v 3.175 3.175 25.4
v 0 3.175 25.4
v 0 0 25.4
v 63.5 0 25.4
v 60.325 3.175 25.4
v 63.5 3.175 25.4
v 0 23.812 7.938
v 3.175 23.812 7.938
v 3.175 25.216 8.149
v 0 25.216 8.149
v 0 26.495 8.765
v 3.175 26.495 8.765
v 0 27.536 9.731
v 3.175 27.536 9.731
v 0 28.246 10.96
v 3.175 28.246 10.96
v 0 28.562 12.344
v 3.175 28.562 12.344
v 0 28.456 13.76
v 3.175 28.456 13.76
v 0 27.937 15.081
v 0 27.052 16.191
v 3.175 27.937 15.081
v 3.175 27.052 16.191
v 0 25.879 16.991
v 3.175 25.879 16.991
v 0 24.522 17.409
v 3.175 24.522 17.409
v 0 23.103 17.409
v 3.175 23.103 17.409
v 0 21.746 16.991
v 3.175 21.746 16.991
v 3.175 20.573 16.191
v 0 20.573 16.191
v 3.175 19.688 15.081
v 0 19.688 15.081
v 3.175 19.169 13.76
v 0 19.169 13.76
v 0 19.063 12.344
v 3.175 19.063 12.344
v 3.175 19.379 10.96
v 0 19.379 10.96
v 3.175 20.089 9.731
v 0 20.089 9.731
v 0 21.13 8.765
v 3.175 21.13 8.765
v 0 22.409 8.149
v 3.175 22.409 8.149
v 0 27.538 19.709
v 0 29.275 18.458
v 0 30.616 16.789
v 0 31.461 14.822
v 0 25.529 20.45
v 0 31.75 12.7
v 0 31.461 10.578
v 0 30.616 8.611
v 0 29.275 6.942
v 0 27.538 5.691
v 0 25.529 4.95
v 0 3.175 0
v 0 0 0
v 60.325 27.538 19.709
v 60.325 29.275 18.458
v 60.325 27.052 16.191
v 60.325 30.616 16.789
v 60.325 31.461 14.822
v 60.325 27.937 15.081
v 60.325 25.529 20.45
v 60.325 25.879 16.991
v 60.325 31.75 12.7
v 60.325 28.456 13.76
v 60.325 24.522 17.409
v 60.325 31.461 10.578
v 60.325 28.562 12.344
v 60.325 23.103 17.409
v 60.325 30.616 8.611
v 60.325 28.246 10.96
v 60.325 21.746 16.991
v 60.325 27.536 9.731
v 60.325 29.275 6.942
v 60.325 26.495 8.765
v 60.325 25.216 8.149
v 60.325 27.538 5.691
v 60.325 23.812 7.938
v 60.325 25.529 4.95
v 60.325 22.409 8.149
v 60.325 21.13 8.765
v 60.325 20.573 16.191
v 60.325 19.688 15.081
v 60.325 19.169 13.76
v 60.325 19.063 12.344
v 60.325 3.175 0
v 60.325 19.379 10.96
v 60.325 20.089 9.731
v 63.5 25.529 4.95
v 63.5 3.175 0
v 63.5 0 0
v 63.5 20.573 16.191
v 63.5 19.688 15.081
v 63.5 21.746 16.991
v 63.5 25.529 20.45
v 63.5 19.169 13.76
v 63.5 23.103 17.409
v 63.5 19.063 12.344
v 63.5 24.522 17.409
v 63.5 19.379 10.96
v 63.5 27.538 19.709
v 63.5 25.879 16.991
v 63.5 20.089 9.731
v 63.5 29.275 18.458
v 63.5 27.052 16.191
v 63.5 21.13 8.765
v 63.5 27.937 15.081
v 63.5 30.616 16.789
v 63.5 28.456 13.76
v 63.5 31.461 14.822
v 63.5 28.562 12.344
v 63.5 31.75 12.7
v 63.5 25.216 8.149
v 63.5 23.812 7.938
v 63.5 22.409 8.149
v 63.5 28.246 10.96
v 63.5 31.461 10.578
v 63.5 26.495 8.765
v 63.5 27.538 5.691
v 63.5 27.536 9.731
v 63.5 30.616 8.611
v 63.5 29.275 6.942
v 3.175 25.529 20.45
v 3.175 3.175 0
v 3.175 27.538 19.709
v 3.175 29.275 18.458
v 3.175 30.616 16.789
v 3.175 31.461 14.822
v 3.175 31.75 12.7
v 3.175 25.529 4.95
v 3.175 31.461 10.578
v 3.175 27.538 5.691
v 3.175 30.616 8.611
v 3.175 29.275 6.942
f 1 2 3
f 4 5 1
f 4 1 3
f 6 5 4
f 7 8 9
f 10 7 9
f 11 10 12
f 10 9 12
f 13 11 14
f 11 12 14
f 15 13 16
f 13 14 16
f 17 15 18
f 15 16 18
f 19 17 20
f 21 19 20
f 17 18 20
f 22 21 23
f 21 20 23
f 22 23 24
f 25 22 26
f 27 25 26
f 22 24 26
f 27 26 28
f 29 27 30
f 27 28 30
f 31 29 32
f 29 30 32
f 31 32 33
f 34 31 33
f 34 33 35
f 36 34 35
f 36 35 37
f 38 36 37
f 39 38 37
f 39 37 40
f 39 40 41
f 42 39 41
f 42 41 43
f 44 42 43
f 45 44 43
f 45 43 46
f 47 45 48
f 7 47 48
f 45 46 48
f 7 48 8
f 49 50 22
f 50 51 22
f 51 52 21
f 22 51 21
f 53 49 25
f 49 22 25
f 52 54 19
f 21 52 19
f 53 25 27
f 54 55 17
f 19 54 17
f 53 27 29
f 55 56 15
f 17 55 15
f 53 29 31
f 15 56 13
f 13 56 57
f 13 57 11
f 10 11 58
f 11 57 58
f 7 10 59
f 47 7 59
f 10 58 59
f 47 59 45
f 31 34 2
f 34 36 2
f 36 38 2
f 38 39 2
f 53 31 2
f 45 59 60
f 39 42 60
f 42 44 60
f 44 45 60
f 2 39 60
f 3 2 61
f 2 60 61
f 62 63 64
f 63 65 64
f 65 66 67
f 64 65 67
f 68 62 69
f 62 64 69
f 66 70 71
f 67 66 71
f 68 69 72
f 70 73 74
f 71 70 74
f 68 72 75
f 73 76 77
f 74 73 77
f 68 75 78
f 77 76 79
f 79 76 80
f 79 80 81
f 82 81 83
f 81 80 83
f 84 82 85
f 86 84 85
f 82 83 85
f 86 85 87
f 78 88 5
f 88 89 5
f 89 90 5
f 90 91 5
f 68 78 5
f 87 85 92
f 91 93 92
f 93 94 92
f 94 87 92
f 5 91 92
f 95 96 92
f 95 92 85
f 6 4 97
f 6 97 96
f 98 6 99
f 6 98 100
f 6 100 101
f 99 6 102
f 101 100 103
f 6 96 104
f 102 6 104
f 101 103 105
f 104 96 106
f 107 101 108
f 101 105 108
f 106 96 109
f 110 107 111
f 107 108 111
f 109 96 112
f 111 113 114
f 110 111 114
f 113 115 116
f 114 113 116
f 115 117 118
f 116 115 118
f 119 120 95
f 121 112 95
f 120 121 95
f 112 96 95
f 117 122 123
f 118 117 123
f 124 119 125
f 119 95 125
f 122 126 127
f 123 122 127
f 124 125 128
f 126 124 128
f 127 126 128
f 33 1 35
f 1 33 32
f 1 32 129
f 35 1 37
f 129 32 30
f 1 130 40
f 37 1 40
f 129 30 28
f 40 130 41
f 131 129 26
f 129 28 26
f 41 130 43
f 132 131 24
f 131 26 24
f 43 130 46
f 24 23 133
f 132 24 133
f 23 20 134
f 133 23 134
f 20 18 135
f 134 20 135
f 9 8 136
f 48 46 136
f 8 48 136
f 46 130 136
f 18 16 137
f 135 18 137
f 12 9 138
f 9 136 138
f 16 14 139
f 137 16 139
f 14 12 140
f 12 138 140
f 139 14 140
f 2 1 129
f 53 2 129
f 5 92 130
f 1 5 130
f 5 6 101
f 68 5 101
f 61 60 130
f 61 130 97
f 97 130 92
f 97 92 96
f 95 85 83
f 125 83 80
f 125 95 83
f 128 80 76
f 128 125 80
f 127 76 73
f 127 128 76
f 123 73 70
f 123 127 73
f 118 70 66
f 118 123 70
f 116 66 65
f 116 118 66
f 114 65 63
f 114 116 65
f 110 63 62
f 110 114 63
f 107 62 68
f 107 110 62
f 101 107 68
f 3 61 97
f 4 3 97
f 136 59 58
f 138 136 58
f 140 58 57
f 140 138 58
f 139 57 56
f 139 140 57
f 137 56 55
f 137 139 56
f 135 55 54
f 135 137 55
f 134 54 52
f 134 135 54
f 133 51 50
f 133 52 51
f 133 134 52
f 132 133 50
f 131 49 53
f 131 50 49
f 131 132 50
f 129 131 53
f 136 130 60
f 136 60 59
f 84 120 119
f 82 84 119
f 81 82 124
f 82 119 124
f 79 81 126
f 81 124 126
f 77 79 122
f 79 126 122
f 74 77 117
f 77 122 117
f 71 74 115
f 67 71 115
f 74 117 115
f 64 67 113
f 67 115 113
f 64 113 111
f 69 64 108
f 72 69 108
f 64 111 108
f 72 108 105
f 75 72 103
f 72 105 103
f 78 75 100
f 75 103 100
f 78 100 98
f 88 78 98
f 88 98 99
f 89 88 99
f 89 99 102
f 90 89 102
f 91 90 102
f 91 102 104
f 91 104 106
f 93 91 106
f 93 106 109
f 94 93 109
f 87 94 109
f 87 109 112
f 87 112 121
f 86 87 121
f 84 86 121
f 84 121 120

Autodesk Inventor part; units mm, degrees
ref_plane "YZ Plane" through (0, 0, 0) normal (1, 0, 0) x (0, 1, 0)
ref_plane "XZ Plane" through (0, 0, 0) normal (0, 1, 0) x (-1, 0, 0)
ref_plane "XY Plane" through (0, 0, 0) normal (0, 0, 1) x (1, 0, 0)
sketch "Sketch1" plane through (0, 0, 0) normal (0, 0, 1) x (1, 0, 0)
  line L0 (0, 0) -> (63.5, 0)
  line L1 (63.5, 0) -> (63.5, 31.75)
  line L2 (0, 31.75) -> (0, 0)
  line L3 (60.325, 31.75) -> (60.325, 3.175)
  line L4 (60.325, 3.175) -> (3.175, 3.175)
  line L5 (3.175, 3.175) -> (3.175, 31.75)
  line L6 (63.5, 31.75) -> (60.325, 31.75)
  line L7 (3.175, 31.75) -> (0, 31.75)
  dimension "d0" = 31.75
  dimension "d1" = 63.5
  dimension "d2" = 3.175
  dimension "d3" = 3.175
  dimension "d4" = 3.175
extrude "Extrusion1" add sketch "Sketch1" along normal blind 25.4
sketch "Sketch2" plane through (63.5, 0, 0) normal (1, 0, 0) x (0, 0, -1)
  line L0 (-25.4, 31.75) -> (-25.4, 0) projected
  line L1 (0, 0) -> (-25.4, 0) projected
  line L2 (0, 0) -> (0, 31.75) projected
  line L3 (0, 31.75) -> (-25.4, 31.75) projected
  arc A0 (-4.9503, 25.5287) -> (-20.4497, 25.5287) centre (-12.7, 23.8125) ccw
  line L4 (-25.4, 3.175) -> (-20.4497, 25.5287)
  line L5 (0, 3.175) -> (-4.9503, 25.5287)
  circle A1 centre (-12.7, 23.8125) radius 4.7625
  dimension "d7" = 15.875
  dimension "d8" = 3.175
  dimension "d9" = 9.525
  dimension "d10" = 12.7
extrude "Extrusion2" cut sketch "Sketch2" against normal through all contours L3 A0 L4 L0 | L3 L2 L5 A0 | A1
equation "\"d3\" = d2"
equation "\"d4\" = d3"
properties part number "manipulator apendage pivot"
